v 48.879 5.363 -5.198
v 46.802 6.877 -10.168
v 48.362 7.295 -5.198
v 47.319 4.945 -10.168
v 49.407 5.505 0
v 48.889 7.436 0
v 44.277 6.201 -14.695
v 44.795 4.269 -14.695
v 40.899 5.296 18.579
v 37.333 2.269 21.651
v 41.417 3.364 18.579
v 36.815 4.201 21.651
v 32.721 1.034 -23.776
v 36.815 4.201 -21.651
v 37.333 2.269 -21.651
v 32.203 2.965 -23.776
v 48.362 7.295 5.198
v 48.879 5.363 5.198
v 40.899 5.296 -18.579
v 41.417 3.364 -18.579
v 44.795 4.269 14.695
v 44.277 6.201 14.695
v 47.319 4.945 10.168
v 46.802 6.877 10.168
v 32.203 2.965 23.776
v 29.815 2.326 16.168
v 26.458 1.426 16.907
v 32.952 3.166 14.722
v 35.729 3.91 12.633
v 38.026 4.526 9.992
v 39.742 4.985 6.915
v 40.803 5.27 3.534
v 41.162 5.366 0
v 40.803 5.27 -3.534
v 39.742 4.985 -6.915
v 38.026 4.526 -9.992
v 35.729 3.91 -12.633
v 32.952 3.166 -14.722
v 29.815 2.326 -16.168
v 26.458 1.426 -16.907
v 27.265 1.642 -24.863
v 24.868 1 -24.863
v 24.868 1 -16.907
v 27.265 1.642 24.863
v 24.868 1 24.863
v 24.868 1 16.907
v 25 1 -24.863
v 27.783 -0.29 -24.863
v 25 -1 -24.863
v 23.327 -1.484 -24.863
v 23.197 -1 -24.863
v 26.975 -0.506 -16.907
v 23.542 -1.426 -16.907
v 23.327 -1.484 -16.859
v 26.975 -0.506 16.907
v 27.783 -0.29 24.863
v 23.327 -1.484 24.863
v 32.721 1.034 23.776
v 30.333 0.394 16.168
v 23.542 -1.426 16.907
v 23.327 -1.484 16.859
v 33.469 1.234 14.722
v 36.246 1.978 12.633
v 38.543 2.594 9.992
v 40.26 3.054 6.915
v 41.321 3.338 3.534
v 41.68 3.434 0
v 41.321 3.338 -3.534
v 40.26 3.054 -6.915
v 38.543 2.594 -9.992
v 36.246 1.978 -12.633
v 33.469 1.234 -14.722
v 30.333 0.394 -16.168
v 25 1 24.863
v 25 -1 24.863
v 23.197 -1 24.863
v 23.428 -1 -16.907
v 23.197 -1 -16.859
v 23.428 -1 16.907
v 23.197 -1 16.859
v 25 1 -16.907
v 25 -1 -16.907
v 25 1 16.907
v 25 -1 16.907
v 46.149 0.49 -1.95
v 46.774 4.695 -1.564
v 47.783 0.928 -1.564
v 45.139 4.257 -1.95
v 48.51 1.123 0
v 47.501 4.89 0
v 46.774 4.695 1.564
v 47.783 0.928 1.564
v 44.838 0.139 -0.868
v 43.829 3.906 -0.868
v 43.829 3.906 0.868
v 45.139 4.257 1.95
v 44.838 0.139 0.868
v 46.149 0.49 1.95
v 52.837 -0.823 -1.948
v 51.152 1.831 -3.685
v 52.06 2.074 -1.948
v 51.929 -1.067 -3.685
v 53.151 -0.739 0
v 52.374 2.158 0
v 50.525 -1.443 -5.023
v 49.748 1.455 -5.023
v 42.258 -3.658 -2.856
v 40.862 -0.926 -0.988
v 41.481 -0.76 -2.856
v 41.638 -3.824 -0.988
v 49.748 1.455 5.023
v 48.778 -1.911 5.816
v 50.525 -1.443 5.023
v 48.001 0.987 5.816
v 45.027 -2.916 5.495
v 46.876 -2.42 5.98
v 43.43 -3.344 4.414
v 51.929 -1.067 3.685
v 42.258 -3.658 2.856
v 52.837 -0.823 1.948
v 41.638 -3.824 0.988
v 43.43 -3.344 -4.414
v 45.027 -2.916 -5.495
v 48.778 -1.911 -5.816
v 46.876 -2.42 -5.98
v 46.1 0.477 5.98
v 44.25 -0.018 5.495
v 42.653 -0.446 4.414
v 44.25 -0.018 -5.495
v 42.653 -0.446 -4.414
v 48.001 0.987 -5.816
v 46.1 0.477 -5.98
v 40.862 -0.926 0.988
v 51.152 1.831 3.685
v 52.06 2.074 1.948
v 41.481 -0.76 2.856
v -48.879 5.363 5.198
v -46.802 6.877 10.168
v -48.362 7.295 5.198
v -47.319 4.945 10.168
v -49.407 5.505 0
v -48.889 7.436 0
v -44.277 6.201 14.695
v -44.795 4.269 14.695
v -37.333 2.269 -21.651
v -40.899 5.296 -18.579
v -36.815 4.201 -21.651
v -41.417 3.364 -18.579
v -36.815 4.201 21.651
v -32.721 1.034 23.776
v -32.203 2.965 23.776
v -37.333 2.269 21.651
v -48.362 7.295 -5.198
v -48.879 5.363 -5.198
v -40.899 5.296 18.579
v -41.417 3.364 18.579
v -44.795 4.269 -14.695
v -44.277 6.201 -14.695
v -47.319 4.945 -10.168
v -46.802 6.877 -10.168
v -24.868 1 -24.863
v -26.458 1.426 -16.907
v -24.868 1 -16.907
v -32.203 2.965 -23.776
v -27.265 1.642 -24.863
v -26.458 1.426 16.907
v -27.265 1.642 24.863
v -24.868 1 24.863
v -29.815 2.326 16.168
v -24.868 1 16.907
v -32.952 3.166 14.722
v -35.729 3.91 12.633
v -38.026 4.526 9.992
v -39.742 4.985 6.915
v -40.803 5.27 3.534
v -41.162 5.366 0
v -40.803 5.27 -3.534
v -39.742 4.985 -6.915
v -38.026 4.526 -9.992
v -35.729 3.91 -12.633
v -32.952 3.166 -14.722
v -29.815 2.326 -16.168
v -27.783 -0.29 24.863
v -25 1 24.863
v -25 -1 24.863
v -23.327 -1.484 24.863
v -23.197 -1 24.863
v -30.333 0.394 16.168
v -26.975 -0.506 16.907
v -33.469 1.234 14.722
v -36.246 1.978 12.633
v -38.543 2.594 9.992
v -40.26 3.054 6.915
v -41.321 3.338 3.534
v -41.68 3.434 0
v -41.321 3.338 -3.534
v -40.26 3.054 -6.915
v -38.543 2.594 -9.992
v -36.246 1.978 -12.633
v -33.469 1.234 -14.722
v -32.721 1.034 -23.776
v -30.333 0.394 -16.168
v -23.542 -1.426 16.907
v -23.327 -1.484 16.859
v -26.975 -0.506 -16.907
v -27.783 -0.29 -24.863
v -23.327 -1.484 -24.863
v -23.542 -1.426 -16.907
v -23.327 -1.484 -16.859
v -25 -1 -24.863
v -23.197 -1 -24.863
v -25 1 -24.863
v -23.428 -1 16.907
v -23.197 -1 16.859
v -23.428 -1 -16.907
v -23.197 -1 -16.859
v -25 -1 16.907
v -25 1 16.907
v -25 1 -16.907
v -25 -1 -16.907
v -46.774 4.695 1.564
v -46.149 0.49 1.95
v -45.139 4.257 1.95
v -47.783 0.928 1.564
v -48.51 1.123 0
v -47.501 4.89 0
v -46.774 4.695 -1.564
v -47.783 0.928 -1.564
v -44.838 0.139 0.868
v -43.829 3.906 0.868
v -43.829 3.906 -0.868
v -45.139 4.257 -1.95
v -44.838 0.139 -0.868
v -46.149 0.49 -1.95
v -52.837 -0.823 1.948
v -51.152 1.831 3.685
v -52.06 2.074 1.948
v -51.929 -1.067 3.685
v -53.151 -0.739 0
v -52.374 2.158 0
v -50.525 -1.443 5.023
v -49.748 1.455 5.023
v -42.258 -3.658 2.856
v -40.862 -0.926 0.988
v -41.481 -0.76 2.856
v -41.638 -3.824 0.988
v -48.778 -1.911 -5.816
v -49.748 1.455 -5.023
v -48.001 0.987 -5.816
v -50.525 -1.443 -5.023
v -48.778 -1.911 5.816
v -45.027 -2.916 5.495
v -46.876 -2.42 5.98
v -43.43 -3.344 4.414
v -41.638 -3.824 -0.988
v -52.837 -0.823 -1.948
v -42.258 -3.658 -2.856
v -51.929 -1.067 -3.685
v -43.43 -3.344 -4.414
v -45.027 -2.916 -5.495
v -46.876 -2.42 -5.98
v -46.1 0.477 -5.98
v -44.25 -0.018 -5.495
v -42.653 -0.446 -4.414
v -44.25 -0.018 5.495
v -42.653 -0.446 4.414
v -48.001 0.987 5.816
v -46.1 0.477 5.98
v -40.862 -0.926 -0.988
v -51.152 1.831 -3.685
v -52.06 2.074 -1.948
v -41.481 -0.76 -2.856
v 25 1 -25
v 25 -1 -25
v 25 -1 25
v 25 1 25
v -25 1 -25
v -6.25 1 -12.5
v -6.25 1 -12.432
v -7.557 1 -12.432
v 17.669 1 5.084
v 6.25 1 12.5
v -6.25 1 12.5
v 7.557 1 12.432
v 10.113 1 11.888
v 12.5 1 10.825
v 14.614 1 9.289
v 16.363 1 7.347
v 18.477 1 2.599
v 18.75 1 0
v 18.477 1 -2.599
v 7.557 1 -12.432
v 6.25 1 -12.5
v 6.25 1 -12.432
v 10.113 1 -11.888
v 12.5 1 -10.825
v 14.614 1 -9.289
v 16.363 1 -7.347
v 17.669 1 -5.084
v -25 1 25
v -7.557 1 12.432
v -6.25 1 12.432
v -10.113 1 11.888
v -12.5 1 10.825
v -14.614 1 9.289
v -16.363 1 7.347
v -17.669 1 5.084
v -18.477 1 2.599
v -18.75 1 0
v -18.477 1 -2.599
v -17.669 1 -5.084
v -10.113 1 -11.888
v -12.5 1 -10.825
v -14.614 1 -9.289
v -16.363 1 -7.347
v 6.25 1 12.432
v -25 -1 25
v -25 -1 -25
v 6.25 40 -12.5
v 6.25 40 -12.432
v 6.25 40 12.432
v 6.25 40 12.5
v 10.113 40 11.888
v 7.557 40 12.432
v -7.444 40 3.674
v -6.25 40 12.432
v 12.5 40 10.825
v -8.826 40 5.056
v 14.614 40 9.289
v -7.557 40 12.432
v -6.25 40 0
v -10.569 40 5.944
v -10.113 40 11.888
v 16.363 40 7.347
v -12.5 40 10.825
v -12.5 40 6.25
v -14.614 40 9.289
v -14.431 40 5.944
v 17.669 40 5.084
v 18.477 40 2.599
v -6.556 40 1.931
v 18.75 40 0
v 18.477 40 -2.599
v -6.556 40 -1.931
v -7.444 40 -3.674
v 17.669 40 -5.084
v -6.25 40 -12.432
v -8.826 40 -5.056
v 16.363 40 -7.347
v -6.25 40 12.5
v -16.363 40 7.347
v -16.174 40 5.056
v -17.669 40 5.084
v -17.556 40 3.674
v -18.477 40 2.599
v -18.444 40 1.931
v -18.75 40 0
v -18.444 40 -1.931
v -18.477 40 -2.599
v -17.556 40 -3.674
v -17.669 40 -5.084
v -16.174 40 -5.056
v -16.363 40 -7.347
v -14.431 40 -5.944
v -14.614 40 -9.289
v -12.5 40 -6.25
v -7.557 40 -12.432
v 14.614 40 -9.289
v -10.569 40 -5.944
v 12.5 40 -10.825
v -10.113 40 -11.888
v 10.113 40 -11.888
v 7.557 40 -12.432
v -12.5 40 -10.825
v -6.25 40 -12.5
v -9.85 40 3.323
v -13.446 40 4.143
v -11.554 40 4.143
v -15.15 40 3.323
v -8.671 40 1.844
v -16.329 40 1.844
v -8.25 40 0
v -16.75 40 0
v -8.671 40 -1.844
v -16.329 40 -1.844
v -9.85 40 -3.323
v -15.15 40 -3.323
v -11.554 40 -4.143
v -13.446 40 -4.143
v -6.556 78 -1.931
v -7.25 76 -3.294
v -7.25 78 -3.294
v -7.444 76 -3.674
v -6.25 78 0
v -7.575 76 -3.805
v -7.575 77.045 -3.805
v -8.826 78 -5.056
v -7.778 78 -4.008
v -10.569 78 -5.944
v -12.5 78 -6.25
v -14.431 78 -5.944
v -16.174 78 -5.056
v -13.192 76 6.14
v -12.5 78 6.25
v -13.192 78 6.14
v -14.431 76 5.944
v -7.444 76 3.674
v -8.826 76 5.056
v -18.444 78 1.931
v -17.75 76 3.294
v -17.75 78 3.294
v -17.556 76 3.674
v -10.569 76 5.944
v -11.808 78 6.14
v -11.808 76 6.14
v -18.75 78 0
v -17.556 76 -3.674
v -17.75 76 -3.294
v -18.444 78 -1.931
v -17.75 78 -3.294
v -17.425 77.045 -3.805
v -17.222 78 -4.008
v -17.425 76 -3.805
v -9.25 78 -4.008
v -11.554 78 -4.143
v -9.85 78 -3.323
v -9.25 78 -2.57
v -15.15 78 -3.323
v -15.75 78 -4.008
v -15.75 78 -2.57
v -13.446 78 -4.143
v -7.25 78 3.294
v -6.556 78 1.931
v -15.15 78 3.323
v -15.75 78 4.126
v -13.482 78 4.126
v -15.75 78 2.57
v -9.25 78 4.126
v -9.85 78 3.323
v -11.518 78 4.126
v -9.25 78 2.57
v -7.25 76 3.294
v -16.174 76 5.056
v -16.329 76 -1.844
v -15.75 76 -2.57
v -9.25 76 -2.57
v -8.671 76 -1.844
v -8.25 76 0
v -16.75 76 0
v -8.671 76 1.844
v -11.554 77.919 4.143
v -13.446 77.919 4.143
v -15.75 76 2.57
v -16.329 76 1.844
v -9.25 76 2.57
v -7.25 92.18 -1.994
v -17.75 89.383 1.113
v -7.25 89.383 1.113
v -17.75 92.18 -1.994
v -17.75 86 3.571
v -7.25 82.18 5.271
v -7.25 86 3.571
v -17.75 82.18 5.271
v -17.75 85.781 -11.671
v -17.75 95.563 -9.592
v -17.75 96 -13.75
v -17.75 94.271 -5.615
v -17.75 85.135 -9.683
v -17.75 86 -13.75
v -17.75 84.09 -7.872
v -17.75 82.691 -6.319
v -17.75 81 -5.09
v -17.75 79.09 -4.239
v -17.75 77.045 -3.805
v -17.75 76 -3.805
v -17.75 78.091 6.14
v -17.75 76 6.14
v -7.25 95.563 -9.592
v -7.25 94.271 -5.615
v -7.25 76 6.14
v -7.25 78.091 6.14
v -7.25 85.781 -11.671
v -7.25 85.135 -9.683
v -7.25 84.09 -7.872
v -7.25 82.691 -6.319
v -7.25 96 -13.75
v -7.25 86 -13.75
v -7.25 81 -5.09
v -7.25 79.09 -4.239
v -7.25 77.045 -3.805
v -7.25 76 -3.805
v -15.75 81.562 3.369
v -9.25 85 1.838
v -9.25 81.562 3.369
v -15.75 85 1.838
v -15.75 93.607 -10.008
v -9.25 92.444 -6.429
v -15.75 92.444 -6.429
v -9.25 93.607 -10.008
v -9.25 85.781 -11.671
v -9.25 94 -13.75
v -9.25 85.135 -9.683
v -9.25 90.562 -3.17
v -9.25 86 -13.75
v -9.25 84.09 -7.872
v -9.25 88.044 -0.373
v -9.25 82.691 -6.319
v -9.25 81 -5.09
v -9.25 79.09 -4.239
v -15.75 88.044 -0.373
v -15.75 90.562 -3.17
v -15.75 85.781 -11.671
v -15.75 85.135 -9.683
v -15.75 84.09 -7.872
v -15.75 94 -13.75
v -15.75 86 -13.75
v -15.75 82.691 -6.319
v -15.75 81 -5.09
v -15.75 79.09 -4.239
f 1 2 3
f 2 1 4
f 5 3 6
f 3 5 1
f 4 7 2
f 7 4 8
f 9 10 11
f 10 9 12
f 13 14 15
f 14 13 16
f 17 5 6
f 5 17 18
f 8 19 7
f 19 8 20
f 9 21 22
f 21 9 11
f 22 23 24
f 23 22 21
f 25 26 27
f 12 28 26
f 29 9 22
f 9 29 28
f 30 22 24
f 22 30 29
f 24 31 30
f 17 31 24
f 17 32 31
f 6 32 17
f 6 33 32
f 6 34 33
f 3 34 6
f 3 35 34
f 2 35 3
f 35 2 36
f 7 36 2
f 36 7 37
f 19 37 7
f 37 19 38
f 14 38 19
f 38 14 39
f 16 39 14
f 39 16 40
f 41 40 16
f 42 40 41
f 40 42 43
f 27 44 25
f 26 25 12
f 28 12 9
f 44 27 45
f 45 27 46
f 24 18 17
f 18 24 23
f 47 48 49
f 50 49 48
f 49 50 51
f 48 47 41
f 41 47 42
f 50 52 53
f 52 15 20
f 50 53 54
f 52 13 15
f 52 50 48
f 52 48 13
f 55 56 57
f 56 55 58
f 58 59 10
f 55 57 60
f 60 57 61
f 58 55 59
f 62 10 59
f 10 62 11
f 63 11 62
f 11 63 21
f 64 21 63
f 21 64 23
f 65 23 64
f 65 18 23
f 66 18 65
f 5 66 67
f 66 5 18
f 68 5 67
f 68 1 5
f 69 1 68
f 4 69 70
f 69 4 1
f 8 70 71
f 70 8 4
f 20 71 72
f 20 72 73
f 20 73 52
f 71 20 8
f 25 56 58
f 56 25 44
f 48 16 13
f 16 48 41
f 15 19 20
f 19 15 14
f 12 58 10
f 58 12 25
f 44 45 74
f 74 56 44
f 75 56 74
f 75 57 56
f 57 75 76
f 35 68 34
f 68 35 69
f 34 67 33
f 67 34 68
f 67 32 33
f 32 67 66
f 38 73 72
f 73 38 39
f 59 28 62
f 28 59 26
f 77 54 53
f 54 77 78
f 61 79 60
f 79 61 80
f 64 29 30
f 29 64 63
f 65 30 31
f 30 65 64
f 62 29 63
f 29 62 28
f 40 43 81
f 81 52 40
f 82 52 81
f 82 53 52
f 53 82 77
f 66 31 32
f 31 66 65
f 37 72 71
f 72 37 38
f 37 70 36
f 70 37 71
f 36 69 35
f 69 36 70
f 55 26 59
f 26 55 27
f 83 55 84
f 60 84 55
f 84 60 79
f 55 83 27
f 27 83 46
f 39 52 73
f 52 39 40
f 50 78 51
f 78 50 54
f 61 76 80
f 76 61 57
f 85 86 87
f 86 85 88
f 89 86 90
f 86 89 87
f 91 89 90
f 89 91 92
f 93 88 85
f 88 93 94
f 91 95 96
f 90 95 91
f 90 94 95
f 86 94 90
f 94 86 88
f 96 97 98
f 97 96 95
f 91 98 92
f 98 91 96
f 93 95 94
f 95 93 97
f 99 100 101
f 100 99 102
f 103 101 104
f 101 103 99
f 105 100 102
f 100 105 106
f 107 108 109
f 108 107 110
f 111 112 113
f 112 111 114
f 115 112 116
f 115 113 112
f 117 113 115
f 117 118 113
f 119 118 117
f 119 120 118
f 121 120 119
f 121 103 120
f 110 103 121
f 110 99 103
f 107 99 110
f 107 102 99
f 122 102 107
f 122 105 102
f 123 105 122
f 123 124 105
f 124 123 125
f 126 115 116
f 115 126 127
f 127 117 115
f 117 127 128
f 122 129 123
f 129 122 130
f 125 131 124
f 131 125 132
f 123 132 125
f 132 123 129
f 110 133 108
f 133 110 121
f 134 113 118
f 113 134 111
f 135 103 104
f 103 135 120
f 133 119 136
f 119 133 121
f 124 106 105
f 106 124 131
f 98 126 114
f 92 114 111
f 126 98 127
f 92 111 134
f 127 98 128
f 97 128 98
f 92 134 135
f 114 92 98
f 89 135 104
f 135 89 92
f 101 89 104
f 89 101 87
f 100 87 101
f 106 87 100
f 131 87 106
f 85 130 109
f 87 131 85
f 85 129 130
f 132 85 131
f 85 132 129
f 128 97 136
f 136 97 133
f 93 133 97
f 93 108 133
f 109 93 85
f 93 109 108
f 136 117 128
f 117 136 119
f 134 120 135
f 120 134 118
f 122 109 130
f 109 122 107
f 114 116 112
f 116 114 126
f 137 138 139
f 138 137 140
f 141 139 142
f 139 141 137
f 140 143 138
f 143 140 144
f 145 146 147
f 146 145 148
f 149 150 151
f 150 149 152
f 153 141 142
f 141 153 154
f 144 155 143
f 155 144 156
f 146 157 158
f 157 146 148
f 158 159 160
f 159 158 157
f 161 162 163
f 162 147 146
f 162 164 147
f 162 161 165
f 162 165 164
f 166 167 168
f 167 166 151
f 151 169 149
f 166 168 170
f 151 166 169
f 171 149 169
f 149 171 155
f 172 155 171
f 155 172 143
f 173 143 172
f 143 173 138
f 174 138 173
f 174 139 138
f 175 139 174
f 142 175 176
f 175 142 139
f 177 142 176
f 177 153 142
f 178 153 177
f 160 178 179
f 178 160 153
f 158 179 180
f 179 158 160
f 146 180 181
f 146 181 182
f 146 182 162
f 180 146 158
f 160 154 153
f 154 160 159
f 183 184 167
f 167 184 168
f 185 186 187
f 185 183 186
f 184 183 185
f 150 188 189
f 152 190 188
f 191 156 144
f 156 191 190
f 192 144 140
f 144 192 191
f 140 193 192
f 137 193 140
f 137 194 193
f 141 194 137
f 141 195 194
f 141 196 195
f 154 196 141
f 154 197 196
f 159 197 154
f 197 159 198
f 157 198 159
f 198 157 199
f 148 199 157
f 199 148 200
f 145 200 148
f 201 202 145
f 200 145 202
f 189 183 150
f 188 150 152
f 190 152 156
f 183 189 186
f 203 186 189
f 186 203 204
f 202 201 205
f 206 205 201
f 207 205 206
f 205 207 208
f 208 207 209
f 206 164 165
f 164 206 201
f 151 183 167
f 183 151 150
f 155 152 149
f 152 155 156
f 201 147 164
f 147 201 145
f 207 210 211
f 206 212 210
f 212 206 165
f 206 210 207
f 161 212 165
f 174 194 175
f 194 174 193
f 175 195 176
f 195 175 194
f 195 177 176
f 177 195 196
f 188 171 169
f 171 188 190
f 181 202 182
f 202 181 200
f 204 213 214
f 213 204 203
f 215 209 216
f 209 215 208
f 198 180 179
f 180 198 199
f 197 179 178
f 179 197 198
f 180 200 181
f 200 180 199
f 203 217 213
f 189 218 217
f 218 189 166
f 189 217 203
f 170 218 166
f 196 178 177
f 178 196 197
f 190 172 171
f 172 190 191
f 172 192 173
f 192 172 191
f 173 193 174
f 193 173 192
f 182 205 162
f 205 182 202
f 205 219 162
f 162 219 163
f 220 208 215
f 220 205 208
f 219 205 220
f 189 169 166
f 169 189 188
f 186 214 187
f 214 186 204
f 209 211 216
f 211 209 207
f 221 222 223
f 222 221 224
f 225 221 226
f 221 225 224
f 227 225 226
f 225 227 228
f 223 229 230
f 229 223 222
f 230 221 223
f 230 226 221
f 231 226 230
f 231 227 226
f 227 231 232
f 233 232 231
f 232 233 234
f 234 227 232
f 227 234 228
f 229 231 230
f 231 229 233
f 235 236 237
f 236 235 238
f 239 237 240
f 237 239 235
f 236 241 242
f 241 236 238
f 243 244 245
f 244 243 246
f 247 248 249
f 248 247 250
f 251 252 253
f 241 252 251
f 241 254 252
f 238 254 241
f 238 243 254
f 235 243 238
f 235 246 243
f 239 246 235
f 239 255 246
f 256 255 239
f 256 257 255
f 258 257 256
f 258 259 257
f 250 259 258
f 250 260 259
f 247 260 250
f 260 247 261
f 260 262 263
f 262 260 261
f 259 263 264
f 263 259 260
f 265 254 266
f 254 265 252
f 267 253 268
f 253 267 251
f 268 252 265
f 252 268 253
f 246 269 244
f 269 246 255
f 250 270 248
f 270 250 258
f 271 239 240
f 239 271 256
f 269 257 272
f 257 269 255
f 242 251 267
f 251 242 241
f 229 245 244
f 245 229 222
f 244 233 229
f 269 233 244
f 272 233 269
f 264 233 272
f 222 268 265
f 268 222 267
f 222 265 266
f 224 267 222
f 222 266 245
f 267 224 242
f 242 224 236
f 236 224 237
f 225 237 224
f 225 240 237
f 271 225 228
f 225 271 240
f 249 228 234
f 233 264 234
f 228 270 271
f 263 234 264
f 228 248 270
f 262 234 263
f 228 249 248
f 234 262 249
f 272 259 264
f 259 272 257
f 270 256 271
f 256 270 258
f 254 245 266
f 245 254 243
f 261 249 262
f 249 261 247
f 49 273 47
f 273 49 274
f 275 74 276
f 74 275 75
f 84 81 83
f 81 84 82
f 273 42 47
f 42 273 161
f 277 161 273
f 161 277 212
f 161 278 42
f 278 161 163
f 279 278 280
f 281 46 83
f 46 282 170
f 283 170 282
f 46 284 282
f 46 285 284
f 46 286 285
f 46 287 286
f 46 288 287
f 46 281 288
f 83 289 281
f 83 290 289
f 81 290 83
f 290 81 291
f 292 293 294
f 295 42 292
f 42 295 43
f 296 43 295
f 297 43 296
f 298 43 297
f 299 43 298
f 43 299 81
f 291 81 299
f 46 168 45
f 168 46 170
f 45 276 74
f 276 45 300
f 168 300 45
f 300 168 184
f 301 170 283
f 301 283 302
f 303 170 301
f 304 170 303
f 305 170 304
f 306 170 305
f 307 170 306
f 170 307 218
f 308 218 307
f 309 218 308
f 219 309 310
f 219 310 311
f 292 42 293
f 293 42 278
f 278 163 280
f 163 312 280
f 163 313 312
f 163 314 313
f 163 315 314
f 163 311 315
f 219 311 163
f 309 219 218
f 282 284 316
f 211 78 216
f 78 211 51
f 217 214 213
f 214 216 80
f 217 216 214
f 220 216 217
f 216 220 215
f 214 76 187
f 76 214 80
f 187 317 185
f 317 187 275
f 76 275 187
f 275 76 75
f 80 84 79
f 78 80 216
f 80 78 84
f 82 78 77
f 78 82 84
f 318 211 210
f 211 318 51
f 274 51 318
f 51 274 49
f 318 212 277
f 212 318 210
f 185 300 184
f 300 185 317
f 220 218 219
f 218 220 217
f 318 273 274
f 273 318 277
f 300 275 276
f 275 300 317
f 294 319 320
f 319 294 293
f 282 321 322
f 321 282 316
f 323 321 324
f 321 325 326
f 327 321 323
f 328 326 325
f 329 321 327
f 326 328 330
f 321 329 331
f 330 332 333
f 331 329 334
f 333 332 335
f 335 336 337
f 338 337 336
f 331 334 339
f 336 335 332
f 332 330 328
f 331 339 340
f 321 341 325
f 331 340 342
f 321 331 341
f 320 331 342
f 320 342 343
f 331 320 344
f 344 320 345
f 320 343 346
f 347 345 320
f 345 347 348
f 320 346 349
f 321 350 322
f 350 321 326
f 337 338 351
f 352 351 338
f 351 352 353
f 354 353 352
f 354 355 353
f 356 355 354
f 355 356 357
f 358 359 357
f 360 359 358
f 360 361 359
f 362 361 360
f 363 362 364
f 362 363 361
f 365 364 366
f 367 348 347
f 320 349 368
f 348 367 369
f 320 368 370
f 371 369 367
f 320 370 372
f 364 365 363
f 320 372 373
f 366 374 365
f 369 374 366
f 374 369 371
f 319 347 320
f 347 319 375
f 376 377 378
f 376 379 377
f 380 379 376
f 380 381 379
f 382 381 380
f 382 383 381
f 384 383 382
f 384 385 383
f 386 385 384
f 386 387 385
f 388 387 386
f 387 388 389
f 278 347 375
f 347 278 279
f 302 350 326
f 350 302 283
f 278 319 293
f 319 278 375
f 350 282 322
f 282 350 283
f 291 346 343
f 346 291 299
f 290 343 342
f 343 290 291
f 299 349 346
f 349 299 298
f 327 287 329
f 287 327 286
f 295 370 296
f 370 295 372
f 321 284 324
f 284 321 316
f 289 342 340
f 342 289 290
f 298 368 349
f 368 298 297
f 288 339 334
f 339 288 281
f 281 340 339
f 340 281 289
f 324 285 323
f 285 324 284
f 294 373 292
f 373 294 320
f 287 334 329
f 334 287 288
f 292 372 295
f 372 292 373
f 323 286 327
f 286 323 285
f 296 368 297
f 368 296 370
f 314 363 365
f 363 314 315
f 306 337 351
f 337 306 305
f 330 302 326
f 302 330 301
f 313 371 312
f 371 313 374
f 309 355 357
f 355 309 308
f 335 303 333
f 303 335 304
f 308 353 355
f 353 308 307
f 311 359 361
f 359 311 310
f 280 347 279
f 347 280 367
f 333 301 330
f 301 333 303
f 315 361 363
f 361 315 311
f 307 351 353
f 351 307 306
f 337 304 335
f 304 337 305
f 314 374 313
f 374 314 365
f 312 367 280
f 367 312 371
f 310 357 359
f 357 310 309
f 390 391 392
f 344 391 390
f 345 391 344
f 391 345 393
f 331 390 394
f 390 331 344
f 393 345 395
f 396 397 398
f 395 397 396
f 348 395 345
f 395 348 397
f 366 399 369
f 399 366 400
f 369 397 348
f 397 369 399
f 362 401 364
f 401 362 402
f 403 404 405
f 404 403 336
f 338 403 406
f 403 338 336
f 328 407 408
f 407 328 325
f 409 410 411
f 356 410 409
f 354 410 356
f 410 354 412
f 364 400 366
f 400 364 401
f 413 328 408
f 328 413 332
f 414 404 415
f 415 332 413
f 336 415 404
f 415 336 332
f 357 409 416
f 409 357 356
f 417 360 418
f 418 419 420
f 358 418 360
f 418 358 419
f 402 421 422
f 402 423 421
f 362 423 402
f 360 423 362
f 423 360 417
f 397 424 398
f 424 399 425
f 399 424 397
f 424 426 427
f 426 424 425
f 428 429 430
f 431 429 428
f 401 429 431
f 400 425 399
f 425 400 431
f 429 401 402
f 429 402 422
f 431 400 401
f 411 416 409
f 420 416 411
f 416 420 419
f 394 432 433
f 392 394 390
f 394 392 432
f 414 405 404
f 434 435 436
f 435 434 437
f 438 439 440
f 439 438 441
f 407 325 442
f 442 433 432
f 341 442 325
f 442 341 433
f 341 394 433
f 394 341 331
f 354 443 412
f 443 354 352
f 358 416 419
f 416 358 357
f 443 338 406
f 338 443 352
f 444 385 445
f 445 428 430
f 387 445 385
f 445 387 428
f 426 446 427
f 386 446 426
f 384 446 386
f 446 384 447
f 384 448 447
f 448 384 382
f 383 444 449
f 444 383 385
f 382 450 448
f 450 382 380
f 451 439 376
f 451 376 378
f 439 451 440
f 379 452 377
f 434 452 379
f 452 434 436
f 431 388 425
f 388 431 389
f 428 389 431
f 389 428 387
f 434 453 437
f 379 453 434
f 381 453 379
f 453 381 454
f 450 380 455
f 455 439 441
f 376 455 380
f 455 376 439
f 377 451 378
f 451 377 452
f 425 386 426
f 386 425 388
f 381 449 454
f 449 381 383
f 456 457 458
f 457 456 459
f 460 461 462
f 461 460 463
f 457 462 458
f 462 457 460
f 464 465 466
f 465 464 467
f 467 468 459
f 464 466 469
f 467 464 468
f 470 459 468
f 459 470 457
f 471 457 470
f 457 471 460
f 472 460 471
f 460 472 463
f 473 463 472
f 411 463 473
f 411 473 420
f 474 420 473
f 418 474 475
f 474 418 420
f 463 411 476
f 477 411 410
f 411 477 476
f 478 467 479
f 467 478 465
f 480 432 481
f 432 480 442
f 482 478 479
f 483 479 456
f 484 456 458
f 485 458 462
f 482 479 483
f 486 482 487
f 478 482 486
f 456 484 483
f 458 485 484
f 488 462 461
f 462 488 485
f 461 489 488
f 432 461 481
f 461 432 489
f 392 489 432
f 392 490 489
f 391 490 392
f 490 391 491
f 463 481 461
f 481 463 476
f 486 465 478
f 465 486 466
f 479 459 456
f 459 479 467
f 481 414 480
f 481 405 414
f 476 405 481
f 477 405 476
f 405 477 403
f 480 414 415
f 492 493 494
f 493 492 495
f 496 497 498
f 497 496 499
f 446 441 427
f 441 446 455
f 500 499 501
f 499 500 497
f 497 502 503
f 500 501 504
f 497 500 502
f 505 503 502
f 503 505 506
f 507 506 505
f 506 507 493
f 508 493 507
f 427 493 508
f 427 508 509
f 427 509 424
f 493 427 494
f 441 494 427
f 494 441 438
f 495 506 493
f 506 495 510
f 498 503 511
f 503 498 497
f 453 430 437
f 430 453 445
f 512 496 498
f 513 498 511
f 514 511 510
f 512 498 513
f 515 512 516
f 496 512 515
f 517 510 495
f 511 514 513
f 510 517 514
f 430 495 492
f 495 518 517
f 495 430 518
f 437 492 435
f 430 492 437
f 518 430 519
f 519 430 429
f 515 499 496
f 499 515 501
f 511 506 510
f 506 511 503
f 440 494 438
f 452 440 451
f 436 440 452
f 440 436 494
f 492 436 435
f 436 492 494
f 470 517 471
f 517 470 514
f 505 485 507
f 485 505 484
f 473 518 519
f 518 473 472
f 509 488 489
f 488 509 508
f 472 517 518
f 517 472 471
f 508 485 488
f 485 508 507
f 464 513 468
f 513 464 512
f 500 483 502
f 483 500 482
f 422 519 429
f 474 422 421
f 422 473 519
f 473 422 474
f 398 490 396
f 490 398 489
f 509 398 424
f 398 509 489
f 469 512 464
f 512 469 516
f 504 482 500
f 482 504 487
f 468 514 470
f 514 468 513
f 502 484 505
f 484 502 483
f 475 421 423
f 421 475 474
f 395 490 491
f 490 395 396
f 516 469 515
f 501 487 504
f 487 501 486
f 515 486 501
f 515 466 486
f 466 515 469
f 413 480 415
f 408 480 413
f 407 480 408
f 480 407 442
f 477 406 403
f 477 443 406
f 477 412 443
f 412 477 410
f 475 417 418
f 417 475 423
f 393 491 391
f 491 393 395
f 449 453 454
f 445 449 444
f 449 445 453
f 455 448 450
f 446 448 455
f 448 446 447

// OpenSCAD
// Cânula Orotraqueal

e = 2; // espessura das paredes

le = 50; //largura
ae = 50; //altura
rotate([-90,0,0]) 
    externo(le, ae);

lb = le/2; //largura
ab = ae/2; //altura
pb = 40; //profundidade
rotate([-90,0,0])
    boca(lb, ab, pb); 

dt = lb/2; //diâmetro do tubo
pbt = pb; //profundidade a partir da parte da boca
ptt = pb/2; //profundidade dentro da traqueia
translate([-lb/2,pb-e,0])
rotate([-90,0,0])
    traqueia(dt, pbt, ptt);

module traqueia(d, b, t) { //parte interna à traqueia
    /*intersection() {
        cachimbo(d,b,t);
        translate([0,0,b-d/2]) rotate([0,90,0]) cylinder(d=d, h=d+e, center=true);
    }*/
    // cylinder(d=d, h=b); 
    tubo(d=d, p=b, e=e); //boca
    //traqueia
    translate([0,b/2-d/2,b-e]) rotate([0,90,0]) cachimbo(d-e,b,t);
}
 
module tubo(d, p, e) {
    difference() {
    cylinder(d=d, h=p);
        cylinder(d=d-2*e, h=p+e);
    }
}

module cachimbo(d,b,t) { //parte curva
    difference() {
    cylinder(d=2*t, h=d, center=true);
            cylinder(d=2*t-2*e, h=d-2*e, center=true);
            cylinder(d=t, h=d+e, center=true);
            translate([0,2*t,0]) cube(4*t, center=true); 
            translate([2*t,0,0]) cube(4*t, center=true);   
    }
}
module boca(l, a, p) { //parte interna à boca
    translate([0,0,p/2]) cube([l/2,a,p], center=true);
    translate([l/4,0,0]) cylinder(h=p, d=a);
    translate([-l/4,0,0]) cylinder(h=p, d=a);
}

module externo(l, a) { // parte externa
    alfa = 15; //ângulo de inclinação
    
    cube([l,a,e], center=true);
    translate([l/2,0,0]) rotate([0,-alfa,0]) alca(ae);
    translate([-l/2,0,0]) rotate([0,-alfa,180]) alca(ae);
}

module alca(da) {
    b = 8; //bitola da alça
    abe = 6; // altura do botão para prender elástico
    difference() {
    cylinder(h=e, d=da, center=true);
        cylinder(h=e, d=da-2*b, center=true);
        translate([-da-e,0,0]) cube(da*2, center=true);
        }        
    translate([da/2-b/2,0,0]) botao(b, abe);
}

module botao(b, abe) {
    
    translate([0,0,-0.6*abe-e]) cylinder(d=b/2, h=0.75*abe);
    translate([0,0,-abe-e]) cylinder(d=1.5*b, h=0.5*abe);
    
}
